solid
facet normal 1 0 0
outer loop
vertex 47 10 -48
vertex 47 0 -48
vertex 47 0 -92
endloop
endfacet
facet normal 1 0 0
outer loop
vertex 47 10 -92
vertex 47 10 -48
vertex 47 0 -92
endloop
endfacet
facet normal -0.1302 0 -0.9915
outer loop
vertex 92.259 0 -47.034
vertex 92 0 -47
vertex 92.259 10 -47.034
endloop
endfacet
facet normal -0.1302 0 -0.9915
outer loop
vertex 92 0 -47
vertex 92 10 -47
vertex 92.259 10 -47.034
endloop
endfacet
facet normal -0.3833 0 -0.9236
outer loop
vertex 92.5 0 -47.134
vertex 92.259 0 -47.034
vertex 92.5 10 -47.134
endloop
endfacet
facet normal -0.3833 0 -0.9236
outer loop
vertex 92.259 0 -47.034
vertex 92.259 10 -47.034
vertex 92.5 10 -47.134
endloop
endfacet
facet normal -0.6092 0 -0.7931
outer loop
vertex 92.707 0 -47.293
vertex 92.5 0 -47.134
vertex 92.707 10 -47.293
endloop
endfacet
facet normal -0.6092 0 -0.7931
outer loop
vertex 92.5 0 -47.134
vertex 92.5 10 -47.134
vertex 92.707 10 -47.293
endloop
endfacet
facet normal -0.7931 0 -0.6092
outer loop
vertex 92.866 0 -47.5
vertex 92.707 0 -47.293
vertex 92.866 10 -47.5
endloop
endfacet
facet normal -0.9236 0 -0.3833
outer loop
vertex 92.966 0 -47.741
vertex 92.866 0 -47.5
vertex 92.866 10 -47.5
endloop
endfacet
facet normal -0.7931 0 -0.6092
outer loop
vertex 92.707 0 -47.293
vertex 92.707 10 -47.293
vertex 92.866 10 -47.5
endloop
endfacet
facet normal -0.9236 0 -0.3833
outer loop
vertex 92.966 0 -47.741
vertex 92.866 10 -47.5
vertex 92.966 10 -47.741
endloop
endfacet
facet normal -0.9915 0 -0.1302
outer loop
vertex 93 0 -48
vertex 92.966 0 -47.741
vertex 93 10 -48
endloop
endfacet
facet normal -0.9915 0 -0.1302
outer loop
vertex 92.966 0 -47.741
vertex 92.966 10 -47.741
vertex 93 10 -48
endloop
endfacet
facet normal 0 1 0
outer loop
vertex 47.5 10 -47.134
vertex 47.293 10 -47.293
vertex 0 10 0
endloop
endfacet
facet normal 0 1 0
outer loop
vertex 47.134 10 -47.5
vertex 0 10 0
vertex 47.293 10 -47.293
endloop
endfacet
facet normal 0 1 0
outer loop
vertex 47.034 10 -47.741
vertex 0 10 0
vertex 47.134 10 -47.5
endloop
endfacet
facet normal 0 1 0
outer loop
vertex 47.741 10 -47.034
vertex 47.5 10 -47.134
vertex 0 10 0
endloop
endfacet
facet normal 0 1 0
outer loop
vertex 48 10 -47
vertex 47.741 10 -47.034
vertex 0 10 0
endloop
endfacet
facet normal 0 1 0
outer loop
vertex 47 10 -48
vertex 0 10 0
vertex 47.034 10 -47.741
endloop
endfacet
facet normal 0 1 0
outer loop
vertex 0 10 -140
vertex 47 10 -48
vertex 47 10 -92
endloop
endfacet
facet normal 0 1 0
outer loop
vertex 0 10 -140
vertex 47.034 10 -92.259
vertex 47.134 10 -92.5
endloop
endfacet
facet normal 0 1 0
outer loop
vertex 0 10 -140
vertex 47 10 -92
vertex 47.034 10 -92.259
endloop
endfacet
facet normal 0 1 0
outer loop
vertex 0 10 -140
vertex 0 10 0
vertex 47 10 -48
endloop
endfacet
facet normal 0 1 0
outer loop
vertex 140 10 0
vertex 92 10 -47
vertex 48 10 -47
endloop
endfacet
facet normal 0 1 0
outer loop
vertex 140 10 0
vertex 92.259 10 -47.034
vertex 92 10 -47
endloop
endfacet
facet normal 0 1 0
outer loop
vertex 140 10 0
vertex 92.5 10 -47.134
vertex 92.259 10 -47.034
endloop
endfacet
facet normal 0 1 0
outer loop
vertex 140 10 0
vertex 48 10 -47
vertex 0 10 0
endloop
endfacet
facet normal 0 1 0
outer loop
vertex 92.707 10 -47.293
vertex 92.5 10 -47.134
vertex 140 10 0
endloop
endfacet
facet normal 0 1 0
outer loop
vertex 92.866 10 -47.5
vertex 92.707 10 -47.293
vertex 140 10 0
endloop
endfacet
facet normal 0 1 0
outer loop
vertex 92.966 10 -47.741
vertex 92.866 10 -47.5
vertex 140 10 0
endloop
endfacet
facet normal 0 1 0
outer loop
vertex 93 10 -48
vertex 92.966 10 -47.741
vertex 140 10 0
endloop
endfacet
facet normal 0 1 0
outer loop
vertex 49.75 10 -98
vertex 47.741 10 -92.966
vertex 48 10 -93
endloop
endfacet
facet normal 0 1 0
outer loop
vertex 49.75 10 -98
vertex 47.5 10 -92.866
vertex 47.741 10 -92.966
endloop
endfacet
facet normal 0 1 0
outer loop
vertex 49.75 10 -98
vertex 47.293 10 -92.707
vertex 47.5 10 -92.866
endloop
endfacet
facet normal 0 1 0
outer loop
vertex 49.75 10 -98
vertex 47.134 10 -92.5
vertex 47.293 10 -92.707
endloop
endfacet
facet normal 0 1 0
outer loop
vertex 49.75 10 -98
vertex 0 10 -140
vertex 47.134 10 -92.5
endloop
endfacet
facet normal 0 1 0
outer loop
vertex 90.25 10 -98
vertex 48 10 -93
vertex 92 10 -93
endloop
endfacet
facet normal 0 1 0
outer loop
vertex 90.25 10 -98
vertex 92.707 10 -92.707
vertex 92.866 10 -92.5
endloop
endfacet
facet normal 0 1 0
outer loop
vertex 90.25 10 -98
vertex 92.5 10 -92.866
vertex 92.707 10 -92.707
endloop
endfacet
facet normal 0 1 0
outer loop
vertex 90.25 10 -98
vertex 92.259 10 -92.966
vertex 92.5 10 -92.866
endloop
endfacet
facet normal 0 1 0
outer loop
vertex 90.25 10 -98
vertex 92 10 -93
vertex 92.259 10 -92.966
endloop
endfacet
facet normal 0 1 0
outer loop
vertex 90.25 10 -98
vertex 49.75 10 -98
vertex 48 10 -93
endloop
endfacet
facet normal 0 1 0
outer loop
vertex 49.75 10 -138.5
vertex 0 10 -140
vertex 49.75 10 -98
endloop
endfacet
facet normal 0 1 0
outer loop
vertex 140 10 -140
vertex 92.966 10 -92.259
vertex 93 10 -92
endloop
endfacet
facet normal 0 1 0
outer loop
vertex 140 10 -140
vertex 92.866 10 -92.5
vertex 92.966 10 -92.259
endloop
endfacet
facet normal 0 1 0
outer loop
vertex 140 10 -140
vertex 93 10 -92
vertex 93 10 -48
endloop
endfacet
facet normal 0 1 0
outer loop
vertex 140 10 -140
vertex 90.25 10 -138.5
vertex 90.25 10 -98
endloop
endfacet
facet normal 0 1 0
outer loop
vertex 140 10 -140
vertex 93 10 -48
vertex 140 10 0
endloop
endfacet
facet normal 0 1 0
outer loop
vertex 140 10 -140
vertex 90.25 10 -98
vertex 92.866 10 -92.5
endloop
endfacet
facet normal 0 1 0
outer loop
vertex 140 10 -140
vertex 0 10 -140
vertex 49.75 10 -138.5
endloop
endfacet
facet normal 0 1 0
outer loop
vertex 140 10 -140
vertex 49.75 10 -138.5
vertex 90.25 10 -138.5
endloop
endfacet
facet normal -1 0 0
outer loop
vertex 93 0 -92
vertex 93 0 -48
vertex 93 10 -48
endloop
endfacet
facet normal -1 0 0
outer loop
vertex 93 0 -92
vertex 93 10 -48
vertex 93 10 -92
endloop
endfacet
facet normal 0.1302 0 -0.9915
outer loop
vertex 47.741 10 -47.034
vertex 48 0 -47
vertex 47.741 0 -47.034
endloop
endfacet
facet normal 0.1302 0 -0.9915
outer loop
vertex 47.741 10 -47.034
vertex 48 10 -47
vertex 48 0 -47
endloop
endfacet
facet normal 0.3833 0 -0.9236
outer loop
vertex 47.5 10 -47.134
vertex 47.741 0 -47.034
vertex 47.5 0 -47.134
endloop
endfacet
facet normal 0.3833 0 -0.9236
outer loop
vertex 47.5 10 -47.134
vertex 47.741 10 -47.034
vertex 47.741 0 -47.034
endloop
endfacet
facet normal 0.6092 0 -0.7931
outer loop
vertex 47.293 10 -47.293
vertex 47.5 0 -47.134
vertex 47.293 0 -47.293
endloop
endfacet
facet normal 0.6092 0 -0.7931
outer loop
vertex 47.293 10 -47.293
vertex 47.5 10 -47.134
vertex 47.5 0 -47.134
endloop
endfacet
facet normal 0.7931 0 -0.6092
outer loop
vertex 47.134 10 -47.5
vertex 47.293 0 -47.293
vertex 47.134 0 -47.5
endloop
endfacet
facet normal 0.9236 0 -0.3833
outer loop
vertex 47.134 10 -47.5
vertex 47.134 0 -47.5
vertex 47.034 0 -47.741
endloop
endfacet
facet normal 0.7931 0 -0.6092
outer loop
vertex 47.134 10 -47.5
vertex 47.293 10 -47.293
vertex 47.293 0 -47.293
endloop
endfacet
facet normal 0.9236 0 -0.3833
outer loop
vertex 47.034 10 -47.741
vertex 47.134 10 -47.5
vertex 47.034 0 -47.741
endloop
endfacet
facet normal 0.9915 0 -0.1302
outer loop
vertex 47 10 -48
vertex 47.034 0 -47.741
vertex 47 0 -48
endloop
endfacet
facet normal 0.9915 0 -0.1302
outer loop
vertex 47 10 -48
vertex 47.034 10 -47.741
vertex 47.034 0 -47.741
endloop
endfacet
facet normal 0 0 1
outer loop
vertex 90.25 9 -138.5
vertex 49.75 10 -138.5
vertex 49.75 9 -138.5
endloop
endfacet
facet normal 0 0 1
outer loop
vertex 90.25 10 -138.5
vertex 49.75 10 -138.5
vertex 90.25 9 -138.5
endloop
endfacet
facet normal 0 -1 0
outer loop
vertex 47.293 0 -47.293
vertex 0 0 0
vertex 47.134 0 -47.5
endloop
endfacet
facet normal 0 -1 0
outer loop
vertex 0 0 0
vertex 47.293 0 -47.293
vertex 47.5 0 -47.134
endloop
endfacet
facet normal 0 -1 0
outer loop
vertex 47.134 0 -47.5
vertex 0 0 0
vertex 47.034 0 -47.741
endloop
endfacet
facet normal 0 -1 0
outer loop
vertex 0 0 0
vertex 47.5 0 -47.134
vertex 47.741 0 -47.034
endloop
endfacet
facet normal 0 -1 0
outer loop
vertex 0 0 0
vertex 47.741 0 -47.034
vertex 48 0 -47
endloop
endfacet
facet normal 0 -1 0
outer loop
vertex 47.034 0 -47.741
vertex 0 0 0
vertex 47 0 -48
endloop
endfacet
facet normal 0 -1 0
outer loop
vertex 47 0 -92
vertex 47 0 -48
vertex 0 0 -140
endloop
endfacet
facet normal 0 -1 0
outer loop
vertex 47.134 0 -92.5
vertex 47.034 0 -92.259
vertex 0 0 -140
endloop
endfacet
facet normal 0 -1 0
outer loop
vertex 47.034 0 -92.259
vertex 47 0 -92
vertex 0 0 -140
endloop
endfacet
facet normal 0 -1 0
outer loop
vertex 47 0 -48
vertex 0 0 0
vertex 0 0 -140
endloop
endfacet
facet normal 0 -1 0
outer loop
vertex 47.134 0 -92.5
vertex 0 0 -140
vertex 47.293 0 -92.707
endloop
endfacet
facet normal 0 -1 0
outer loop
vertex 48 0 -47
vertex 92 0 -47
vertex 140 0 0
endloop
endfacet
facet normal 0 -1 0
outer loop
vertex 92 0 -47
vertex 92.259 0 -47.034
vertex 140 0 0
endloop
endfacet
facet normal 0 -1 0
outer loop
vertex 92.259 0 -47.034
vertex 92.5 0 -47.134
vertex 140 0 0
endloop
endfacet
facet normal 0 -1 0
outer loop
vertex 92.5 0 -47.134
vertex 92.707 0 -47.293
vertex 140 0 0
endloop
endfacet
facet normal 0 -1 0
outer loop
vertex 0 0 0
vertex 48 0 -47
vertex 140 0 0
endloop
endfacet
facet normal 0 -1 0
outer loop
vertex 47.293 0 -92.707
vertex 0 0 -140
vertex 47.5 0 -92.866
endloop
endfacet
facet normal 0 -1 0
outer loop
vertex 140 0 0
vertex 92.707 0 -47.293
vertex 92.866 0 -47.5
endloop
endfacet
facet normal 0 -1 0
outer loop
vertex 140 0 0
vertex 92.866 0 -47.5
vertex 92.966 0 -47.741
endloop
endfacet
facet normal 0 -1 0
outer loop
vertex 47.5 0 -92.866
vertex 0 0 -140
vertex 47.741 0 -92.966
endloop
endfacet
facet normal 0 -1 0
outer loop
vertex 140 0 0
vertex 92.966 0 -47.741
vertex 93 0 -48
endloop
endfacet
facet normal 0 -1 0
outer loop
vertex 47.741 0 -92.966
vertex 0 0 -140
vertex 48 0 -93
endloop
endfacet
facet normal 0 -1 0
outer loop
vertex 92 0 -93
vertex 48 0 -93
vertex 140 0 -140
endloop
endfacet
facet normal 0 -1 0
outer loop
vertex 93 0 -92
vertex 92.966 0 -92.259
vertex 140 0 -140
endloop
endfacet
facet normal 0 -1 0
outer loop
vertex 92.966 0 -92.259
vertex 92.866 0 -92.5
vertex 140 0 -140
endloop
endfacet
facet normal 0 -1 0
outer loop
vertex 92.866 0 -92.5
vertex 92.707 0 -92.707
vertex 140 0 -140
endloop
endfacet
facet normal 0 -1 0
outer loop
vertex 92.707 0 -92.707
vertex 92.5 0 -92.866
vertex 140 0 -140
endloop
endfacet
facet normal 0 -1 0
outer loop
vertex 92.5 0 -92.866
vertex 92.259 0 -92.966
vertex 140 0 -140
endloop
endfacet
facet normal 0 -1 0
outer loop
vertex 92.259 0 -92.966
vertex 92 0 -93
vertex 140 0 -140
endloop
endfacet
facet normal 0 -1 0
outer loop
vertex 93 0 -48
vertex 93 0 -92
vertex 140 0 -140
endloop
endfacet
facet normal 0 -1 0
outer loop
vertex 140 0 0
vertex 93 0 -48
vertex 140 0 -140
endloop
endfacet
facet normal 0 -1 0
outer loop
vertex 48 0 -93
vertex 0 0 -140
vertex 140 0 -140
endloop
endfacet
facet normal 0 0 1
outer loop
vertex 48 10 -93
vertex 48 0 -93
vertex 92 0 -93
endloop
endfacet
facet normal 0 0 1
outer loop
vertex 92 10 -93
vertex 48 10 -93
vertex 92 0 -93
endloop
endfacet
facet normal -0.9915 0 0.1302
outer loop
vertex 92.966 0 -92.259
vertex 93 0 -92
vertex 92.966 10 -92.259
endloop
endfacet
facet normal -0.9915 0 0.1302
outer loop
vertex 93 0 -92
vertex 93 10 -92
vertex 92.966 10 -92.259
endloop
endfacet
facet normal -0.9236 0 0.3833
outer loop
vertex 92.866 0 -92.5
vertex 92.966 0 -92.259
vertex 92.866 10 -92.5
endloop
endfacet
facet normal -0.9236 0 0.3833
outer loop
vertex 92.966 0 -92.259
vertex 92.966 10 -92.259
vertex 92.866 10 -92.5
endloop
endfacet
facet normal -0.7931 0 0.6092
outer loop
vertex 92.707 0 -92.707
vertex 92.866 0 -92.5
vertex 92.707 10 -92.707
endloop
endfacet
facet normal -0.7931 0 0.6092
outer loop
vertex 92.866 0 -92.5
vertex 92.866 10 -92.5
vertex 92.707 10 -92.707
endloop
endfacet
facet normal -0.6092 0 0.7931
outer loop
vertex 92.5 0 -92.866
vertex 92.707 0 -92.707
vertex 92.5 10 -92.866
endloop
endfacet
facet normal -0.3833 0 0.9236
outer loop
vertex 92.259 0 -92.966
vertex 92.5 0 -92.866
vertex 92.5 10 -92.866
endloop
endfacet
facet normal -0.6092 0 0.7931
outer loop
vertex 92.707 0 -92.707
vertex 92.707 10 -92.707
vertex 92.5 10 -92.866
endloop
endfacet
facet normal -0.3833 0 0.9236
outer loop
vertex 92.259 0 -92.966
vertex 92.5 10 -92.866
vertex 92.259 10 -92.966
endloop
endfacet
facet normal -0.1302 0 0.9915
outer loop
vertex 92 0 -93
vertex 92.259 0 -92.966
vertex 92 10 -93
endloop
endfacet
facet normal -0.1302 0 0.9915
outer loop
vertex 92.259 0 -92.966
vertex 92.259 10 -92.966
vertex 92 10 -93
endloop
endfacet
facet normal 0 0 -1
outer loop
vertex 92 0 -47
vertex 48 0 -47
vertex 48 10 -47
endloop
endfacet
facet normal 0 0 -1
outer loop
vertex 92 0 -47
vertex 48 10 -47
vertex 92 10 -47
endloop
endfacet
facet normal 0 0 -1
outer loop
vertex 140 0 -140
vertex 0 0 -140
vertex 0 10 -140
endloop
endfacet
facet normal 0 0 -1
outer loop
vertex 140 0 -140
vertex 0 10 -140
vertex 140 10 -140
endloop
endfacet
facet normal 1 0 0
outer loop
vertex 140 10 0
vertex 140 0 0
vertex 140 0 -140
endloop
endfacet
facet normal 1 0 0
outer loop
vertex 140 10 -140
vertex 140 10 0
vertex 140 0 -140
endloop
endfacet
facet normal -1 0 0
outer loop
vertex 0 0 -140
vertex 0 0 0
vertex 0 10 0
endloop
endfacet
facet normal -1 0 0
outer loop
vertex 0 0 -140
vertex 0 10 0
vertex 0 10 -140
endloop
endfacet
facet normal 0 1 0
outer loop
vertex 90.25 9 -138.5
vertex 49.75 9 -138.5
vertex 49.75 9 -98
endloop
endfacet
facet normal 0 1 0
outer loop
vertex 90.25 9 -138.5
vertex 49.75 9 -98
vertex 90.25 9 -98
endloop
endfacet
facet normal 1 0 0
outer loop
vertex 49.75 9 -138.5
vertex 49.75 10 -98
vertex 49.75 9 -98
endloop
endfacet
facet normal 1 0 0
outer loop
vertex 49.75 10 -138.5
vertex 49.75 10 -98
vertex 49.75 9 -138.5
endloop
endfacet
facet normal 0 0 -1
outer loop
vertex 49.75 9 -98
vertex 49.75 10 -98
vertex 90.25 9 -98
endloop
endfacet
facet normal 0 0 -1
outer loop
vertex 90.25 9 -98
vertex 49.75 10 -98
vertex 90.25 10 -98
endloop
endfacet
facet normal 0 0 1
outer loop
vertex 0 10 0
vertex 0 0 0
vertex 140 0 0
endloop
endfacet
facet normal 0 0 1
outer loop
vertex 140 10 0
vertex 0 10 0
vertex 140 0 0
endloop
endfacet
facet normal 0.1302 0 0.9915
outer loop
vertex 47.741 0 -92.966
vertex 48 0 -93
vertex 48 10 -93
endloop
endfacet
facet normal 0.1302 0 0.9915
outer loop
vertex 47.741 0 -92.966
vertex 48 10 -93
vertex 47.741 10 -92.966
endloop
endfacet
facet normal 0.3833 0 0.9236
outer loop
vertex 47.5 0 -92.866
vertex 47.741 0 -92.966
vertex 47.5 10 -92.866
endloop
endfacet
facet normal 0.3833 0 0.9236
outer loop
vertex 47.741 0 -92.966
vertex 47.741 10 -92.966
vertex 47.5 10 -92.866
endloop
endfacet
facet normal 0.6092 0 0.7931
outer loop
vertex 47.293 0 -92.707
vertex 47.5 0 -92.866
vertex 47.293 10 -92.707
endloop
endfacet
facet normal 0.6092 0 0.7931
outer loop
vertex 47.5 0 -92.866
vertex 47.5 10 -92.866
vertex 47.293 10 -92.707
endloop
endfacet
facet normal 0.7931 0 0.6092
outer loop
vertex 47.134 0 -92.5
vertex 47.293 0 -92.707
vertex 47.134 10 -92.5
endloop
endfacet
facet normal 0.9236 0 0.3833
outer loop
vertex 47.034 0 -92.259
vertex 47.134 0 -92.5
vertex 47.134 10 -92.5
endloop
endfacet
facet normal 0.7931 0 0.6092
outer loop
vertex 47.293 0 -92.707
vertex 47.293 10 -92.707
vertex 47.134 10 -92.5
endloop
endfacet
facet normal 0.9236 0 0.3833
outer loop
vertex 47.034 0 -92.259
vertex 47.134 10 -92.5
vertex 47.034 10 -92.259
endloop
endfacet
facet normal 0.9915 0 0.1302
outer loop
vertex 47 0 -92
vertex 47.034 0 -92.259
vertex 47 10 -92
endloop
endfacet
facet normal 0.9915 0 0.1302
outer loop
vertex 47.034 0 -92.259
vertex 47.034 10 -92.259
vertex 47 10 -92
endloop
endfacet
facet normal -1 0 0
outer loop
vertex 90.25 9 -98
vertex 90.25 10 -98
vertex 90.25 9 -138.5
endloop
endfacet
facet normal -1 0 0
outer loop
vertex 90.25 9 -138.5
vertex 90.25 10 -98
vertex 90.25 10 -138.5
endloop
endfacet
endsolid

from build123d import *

# Parameters (mm, degrees)
SKIZZE1_W                       = 140
SKIZZE1_H                       = 140
SKIZZE1_W_2                     = 46
SKIZZE1_H_2                     = 46
AUFSATZ_LINEAR_AUSTRAGEN1_DEPTH = 10
SKIZZE3_W                       = 40.5
SKIZZE3_H                       = 40.5
SCHNITT_LINEAR_AUSTRAGEN1_DEPTH = 1
VERRUNDUNG1_R                   = 1


with BuildPart() as part:
    # Skizze1 → Aufsatz-Linear austragen1 (new body)
    with BuildSketch(Plane(origin=(0, 0, 0), x_dir=(1, 0, 0), z_dir=(0, 1, 0))):
        with Locations((70, 70)):
            Rectangle(SKIZZE1_W, SKIZZE1_H)
        with Locations((70, 70)):
            Rectangle(SKIZZE1_W_2, SKIZZE1_H_2, mode=Mode.SUBTRACT)
    extrude(amount=AUFSATZ_LINEAR_AUSTRAGEN1_DEPTH)

    # Skizze3 → Schnitt-Linear austragen1 (cut)
    with BuildSketch(Plane(origin=(0, 10, 0), x_dir=(1, 0, 0), z_dir=(0, 1, 0))):
        with Locations((70, 118.25)):
            Rectangle(SKIZZE3_W, SKIZZE3_H)
    extrude(amount=-SCHNITT_LINEAR_AUSTRAGEN1_DEPTH, mode=Mode.SUBTRACT)

    # Verrundung1
    verrundung1_edges = [part.edges().sort_by_distance(p)[0] for p in [
        (47, 5, -93),
        (47, 5, -47),
        (93, 5, -47),
        (93, 5, -93),
    ]]
    fillet(verrundung1_edges, radius=VERRUNDUNG1_R)


solid = part.part
